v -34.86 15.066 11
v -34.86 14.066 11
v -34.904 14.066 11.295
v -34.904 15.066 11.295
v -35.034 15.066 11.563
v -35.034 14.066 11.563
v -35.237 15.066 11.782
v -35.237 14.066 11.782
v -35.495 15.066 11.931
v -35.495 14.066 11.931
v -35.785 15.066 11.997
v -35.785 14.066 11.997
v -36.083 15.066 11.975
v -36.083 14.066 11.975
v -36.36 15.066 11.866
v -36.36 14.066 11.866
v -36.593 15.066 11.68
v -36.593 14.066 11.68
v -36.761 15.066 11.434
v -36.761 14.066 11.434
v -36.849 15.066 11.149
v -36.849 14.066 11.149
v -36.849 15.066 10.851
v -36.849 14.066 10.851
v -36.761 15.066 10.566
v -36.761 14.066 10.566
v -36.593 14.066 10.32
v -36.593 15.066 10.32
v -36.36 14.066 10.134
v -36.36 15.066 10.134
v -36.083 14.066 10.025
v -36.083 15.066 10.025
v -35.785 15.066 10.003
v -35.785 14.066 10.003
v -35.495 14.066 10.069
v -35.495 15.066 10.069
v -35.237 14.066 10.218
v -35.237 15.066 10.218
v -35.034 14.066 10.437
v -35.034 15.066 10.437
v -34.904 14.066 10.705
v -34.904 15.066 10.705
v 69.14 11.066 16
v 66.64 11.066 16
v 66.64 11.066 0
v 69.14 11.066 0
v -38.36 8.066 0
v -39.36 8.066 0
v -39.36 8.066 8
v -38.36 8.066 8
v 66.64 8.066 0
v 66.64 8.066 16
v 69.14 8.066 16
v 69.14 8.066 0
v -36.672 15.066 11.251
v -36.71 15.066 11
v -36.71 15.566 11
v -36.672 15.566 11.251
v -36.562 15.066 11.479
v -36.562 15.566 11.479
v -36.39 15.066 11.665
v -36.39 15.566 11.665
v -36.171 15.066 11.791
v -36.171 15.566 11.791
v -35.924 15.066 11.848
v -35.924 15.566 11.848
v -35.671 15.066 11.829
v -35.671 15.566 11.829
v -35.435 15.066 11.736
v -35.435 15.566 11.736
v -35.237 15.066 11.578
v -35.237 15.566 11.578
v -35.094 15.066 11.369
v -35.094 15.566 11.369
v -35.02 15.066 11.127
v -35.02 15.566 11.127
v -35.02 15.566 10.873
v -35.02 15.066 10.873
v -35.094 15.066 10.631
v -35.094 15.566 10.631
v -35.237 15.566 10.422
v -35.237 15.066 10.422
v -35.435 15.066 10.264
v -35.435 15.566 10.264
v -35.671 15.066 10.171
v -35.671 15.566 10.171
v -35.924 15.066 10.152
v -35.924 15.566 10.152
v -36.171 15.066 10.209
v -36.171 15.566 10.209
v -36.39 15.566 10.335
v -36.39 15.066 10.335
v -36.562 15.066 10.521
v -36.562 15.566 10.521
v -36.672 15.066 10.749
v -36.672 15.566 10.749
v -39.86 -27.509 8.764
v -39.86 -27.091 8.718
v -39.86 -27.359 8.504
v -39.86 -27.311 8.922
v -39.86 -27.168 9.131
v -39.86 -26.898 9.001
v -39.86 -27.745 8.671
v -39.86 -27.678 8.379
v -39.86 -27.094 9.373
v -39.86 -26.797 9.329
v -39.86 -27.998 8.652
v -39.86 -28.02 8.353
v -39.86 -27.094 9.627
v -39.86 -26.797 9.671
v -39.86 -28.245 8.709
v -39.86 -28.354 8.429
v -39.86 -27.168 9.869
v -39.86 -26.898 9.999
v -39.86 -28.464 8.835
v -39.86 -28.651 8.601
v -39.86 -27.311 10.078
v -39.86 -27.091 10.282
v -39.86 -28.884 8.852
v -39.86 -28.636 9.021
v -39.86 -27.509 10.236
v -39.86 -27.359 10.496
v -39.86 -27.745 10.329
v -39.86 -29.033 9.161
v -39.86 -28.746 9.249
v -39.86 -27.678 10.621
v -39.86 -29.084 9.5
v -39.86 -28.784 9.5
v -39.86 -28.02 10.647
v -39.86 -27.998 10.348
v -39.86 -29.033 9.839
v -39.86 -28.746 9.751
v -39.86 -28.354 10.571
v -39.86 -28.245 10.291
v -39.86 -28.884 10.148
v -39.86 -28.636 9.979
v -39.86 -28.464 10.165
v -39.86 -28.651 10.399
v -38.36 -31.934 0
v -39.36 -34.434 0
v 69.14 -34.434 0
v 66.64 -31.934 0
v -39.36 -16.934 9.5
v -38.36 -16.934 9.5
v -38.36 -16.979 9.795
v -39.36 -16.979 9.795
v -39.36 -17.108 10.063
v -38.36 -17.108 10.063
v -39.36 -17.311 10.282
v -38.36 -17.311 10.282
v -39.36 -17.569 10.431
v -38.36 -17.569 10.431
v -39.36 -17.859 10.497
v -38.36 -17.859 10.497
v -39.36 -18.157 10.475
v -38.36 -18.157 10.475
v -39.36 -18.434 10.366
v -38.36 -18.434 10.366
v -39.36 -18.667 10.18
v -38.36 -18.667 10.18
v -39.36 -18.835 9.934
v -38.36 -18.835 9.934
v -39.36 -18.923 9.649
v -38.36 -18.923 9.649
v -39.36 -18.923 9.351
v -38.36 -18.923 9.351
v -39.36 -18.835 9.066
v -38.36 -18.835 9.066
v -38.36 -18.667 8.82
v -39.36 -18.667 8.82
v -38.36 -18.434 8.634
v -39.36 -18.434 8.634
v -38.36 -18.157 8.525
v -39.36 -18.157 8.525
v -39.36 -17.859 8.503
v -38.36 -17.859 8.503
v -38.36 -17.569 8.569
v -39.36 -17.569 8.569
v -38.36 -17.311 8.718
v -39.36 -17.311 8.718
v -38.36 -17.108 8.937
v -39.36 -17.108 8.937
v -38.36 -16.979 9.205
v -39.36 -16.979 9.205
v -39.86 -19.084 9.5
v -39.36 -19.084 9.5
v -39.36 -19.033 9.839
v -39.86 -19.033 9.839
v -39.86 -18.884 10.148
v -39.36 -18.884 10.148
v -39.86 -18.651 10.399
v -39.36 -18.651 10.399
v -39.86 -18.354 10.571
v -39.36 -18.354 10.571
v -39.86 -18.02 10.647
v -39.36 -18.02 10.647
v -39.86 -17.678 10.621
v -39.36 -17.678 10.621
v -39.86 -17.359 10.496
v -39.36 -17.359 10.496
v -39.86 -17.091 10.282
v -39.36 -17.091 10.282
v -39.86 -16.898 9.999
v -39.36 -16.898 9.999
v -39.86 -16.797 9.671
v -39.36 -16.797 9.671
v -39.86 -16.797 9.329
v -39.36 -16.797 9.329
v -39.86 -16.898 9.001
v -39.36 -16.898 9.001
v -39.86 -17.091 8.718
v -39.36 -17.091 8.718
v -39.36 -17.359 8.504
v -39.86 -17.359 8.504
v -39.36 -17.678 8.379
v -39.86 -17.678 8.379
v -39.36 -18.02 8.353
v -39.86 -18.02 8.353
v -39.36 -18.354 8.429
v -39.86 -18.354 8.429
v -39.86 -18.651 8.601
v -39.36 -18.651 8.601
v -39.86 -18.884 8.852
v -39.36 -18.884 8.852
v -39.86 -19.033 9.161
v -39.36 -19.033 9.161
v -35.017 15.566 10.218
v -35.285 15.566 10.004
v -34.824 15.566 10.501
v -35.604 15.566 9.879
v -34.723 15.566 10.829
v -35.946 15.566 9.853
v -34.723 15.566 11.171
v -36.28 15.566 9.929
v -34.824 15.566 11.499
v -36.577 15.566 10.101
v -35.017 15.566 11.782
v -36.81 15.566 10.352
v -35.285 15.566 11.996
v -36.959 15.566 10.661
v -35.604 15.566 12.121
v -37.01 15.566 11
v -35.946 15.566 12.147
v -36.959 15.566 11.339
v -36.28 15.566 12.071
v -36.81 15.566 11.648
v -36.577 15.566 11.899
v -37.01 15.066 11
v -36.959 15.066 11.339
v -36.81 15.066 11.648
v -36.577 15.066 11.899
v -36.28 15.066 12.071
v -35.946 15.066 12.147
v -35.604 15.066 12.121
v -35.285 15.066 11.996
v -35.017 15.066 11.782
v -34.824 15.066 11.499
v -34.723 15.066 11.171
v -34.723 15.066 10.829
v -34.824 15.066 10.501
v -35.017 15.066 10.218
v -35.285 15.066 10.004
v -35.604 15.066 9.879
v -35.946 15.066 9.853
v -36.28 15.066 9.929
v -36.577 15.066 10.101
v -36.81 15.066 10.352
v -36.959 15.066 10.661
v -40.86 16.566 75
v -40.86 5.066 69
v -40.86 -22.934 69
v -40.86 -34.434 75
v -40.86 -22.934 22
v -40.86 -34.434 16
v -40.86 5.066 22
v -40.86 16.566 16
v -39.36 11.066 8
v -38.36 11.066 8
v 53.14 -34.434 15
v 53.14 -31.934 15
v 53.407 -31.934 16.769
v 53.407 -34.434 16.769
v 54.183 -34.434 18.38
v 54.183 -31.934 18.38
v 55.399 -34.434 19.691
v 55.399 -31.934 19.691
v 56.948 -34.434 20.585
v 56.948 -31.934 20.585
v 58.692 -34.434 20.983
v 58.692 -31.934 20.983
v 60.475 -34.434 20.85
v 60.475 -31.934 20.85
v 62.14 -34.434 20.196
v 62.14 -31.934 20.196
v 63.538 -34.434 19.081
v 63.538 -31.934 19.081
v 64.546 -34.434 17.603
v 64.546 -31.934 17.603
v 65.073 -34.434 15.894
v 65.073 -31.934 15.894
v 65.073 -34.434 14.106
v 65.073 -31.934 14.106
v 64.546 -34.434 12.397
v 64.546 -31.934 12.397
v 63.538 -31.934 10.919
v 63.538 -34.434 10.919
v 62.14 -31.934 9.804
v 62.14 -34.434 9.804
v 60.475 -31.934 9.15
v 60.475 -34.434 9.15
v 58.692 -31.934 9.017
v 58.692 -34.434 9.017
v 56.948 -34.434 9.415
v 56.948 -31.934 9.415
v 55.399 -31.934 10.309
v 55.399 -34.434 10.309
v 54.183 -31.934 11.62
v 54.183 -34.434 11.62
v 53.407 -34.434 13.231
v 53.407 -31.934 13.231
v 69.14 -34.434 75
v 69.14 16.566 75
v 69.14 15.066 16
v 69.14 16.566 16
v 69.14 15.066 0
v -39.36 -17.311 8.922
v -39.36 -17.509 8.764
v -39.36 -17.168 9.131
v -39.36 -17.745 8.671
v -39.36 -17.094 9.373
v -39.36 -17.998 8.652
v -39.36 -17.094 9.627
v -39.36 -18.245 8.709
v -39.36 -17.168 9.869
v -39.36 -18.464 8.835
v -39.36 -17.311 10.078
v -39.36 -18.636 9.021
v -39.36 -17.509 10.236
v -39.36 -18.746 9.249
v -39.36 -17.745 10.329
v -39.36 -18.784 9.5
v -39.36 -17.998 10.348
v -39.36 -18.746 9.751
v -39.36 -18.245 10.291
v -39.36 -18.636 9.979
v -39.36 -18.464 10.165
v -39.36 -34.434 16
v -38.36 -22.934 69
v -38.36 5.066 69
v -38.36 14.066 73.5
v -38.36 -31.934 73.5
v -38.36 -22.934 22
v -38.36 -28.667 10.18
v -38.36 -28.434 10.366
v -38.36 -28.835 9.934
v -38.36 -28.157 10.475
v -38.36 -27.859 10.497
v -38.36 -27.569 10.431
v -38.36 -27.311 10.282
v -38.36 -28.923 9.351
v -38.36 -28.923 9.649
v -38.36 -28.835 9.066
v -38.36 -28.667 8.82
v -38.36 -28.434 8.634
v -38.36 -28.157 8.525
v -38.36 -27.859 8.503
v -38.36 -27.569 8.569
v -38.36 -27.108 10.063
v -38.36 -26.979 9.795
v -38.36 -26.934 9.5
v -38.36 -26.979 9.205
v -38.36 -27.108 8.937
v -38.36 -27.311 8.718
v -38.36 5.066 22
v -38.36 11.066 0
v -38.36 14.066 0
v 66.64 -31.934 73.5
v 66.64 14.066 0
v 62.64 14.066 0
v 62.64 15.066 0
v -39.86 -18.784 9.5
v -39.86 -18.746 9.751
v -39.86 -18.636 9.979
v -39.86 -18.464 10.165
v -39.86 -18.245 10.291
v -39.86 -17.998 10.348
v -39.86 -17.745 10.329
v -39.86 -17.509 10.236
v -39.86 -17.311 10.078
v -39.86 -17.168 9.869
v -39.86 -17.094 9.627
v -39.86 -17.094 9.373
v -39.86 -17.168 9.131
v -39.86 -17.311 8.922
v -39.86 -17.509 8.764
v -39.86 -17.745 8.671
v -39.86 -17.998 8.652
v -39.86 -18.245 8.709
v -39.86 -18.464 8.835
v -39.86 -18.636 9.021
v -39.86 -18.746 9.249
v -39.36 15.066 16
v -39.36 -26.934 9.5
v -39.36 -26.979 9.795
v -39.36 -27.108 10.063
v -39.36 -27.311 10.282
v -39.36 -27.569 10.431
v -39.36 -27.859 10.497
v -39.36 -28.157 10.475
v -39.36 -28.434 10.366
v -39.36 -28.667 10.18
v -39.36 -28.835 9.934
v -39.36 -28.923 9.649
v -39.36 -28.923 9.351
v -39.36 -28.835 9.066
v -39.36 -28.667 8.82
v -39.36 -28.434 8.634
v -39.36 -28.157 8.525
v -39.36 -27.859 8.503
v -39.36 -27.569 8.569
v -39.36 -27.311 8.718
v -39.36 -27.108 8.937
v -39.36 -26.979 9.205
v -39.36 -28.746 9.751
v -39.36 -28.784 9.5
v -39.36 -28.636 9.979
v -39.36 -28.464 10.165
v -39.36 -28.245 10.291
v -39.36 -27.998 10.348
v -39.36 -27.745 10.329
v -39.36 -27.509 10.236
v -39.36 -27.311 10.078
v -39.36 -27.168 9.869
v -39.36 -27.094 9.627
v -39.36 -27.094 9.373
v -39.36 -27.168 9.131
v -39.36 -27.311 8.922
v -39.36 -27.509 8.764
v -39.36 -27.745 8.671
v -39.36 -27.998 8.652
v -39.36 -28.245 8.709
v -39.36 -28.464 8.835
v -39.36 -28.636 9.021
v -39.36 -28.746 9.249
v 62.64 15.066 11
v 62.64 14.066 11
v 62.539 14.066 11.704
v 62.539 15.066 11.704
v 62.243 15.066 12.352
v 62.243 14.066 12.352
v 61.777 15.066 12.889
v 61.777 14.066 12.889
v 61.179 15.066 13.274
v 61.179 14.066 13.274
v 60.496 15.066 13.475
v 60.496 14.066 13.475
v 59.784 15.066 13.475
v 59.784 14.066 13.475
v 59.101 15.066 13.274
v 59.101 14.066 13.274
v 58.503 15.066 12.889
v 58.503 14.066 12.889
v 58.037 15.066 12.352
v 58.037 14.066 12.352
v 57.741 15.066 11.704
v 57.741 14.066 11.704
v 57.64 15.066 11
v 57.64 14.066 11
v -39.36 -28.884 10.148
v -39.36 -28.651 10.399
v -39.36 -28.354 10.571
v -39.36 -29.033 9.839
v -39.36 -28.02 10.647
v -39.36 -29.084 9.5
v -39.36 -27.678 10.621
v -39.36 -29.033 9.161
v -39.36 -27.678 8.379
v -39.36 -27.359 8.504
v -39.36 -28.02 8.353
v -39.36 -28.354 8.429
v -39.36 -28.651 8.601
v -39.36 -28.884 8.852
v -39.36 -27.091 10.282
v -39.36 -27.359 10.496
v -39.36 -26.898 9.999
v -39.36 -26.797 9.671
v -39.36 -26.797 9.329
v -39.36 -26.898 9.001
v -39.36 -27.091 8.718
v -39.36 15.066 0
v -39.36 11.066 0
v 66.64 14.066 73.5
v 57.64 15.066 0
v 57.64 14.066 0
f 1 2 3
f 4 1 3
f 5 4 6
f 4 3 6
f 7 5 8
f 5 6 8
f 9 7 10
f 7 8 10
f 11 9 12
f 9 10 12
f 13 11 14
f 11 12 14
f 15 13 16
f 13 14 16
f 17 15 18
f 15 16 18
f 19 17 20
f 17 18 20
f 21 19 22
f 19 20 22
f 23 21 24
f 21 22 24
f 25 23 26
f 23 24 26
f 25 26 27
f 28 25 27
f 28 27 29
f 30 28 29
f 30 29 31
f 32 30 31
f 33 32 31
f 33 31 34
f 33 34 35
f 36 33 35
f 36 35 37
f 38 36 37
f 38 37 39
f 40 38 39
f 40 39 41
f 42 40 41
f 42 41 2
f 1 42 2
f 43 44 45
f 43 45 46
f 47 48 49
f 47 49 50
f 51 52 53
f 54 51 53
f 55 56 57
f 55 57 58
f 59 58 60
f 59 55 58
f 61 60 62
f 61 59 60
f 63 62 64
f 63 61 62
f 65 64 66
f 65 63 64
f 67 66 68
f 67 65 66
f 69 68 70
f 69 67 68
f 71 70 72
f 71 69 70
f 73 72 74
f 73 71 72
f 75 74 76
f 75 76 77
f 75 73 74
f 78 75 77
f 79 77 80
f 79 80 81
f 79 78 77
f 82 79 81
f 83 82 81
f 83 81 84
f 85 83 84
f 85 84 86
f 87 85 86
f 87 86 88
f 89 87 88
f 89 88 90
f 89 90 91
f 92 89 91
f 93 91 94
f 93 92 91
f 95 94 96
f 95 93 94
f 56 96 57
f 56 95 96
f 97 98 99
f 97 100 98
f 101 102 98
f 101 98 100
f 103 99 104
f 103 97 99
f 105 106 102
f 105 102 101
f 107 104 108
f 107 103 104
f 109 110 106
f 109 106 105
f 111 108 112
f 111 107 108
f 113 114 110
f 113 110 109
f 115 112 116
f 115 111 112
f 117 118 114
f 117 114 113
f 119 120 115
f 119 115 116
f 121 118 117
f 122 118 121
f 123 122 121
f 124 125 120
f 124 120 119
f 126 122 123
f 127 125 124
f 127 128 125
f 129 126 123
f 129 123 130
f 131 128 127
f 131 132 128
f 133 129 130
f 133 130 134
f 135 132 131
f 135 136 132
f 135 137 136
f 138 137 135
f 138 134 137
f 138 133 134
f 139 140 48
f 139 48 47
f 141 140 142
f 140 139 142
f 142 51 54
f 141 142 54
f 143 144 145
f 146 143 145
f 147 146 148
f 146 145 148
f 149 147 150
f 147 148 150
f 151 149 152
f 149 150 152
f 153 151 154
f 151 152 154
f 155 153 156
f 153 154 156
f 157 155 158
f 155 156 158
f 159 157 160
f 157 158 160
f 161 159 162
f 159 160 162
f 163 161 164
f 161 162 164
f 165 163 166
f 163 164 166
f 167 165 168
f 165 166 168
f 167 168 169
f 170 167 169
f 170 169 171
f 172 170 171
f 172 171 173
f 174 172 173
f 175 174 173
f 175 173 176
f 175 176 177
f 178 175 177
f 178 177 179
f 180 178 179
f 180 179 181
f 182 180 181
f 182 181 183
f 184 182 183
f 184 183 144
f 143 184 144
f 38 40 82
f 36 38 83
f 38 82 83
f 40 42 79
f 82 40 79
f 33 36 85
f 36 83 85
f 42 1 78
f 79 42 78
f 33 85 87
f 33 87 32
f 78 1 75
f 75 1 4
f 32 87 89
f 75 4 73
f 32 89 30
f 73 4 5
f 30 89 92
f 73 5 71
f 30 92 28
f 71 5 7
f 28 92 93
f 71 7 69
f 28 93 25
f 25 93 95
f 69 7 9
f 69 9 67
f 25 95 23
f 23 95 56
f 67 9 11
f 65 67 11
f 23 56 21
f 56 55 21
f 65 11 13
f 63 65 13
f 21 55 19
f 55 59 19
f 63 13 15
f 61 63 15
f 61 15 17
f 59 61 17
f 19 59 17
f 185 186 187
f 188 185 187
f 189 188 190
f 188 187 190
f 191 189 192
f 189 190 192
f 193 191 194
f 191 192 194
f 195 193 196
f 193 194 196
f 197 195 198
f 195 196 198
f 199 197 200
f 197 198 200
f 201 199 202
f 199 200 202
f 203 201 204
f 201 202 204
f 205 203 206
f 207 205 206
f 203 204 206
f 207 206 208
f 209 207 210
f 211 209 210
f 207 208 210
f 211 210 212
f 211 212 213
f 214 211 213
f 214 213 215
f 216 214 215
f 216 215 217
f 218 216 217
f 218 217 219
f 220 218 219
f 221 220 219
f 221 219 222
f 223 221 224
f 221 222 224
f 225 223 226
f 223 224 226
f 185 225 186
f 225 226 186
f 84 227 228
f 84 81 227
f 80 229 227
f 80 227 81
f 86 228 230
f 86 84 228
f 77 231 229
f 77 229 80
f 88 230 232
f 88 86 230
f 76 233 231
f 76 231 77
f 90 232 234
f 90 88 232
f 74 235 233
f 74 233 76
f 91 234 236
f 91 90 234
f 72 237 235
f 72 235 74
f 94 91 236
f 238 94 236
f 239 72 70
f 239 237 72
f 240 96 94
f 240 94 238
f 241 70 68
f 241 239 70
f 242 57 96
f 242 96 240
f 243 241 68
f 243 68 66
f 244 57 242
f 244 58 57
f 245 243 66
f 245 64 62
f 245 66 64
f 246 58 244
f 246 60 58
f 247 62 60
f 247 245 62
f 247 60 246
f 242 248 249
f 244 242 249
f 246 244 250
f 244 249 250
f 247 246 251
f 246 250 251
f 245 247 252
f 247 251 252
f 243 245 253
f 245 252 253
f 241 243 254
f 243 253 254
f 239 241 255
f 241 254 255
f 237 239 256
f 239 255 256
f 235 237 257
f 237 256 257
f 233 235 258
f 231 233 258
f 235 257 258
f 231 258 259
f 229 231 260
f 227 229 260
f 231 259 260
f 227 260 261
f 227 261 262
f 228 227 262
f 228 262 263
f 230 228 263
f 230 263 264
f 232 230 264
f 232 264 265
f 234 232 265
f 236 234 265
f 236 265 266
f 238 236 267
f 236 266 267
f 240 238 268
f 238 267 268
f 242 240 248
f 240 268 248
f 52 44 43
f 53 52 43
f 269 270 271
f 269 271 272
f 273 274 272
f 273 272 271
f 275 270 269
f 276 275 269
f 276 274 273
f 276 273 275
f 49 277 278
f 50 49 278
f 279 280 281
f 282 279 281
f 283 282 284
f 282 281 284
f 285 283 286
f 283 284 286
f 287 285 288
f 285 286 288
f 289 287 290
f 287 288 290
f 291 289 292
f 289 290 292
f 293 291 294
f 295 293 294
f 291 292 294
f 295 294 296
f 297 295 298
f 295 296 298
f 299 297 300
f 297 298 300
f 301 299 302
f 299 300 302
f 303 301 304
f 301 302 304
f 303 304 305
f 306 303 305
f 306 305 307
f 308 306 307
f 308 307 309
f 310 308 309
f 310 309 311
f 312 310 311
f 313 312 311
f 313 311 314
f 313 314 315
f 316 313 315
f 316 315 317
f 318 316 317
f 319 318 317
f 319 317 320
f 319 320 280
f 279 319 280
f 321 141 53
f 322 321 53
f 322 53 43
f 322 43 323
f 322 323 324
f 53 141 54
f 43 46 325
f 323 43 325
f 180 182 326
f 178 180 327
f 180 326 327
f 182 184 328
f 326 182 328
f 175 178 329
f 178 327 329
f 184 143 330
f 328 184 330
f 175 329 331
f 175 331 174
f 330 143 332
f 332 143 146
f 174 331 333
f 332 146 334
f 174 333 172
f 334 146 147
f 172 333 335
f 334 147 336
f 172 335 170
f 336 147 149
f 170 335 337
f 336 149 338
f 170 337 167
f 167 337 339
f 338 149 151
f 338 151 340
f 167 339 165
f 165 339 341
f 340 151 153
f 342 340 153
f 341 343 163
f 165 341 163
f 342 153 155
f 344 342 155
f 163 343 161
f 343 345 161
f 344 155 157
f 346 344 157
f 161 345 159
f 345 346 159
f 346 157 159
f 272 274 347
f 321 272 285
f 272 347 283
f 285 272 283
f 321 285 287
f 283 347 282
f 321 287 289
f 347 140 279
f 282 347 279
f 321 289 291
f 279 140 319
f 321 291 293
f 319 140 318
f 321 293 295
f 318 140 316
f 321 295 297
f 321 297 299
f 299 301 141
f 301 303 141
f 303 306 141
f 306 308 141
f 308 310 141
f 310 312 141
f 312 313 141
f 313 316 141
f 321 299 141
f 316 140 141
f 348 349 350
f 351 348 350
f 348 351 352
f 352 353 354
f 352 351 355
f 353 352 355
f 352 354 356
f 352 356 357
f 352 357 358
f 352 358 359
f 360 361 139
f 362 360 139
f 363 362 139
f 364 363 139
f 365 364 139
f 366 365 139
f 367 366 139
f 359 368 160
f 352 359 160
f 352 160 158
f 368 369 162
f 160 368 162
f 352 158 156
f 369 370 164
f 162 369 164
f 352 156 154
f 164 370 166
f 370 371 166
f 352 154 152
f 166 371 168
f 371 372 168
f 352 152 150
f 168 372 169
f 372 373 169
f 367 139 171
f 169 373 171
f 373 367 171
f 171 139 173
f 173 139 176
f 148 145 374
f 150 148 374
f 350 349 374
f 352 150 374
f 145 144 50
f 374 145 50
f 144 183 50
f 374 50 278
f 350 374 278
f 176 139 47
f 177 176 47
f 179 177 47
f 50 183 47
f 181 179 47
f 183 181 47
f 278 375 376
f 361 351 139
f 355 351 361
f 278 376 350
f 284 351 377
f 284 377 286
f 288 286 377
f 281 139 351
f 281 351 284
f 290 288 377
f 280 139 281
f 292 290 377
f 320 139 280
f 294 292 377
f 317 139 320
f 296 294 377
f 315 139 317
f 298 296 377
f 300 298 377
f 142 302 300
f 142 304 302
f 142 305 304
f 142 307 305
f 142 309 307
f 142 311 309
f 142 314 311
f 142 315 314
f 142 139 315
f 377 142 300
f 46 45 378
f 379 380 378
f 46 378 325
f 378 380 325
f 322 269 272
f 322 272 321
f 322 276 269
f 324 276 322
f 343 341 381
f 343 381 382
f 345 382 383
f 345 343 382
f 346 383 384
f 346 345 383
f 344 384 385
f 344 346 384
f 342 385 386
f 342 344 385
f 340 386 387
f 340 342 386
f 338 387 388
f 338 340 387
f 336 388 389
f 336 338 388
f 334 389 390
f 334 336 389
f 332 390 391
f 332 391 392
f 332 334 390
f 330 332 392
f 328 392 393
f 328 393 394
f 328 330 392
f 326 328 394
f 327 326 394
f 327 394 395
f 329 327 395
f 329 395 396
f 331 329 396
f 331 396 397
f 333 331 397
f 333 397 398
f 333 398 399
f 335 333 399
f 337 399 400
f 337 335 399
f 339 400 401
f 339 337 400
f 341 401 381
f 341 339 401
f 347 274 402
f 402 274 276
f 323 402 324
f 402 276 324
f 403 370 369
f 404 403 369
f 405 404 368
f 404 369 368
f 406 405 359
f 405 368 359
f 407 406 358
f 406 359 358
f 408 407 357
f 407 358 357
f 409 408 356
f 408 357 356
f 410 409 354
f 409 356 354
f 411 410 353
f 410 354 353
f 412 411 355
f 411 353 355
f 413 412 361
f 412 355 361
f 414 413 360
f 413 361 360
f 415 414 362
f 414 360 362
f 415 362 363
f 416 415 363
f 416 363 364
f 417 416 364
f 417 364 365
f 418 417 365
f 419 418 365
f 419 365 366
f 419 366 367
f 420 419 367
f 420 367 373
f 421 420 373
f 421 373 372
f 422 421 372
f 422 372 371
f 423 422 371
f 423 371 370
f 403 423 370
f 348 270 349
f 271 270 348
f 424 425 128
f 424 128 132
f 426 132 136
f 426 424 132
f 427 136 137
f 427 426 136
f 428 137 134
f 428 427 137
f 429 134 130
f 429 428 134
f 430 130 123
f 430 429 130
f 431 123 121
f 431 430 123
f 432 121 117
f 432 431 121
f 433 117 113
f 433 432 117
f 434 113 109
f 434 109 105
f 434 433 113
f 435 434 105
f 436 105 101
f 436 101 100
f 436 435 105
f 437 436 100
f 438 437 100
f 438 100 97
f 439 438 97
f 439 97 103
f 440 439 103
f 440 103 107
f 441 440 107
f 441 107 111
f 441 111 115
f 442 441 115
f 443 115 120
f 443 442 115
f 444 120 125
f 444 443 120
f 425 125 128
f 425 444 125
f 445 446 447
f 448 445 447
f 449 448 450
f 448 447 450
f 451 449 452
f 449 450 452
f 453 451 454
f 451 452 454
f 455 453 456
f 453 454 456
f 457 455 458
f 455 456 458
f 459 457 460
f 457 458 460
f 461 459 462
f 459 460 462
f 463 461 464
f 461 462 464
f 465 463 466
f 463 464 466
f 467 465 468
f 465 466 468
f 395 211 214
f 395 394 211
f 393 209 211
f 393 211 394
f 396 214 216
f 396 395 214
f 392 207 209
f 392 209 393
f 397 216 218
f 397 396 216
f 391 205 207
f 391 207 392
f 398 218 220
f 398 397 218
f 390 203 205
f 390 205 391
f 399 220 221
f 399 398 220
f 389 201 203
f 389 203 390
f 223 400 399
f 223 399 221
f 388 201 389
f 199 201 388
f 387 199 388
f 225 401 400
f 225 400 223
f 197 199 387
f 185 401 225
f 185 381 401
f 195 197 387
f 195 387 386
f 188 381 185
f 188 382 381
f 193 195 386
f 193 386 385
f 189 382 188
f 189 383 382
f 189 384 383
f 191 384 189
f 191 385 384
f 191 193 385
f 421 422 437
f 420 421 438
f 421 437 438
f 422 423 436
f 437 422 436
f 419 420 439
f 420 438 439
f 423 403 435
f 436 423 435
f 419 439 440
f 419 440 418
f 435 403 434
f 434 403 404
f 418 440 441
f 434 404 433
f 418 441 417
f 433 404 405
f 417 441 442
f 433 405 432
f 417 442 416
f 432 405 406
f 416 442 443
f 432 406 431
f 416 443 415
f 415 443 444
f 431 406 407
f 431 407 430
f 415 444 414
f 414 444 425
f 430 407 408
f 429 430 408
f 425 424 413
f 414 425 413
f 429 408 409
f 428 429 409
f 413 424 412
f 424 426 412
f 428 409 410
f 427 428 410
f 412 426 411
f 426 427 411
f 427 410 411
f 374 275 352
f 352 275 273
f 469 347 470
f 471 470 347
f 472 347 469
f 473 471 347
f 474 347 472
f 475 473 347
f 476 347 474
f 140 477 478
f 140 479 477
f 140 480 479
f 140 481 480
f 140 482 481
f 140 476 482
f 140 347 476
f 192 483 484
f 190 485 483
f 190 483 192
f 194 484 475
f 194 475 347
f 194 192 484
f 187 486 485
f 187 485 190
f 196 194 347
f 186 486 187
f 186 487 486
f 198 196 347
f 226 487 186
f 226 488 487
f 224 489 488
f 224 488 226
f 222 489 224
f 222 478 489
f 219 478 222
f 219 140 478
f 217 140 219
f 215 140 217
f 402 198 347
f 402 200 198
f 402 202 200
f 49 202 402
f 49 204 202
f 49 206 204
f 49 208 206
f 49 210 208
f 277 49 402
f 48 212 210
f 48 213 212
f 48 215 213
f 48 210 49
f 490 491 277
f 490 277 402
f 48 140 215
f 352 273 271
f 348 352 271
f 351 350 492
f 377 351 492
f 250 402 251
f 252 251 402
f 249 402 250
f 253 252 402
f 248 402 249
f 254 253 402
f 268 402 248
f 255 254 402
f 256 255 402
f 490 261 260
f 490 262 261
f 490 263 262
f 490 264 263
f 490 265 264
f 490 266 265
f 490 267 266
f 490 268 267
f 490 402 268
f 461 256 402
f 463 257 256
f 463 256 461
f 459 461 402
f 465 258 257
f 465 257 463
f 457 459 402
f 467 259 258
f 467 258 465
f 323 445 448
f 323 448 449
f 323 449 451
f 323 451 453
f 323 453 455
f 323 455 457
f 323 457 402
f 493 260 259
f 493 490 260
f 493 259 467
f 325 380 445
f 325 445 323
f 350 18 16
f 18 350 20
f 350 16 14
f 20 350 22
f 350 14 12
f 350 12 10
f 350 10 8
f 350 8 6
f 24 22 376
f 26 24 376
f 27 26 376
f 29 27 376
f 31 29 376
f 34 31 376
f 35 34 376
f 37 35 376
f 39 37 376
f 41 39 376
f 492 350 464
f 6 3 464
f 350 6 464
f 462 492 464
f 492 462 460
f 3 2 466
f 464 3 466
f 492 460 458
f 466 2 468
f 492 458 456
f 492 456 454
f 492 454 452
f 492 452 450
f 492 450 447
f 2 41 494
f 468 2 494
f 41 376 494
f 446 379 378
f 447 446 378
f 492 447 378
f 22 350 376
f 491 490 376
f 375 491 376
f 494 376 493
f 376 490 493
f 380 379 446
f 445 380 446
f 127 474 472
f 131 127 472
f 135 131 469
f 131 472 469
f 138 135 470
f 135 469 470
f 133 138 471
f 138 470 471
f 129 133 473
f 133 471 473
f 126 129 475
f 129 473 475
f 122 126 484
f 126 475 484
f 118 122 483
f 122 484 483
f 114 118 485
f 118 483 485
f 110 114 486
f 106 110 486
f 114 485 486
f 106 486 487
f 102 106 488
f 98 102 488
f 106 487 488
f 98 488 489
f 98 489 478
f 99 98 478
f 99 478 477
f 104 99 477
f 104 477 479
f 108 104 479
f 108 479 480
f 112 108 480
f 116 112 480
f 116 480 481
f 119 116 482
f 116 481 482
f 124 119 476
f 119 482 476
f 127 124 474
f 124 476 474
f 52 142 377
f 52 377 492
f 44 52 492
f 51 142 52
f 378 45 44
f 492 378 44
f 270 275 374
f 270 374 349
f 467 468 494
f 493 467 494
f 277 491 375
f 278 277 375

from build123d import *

# Parameters (mm, degrees)
F0_W      = 110
F0_H      = 51
F0_W_2    = 105
F0_H_2    = 46
F1_DEPTH  = 75
F3_DEPTH  = 16
F5_W      = 1
F5_H      = 3
F6_DEPTH  = 8
F8_W      = 2.5
F8_H      = 3
F9_DEPTH  = 16
F12_DEPTH = 5
F15_D     = 2
F15_DEPTH = 12
F15_TIP   = 0.600860619
F16_W     = 28
F16_H     = 47
F17_DEPTH = 12.5
F19_W     = 105
F19_H     = 46
F20_DEPTH = 1.5
F22_D     = 12
F22_DEPTH = 12
F22_TIP   = 3.6051637142
F14_R     = 1.15
F14_R_2   = 0.85
F23_DEPTH = 0.5
F25_D     = 2
F25_DEPTH = 12
F25_TIP   = 0.600860619
F24_R     = 1.15
F24_R_2   = 0.85
F26_DEPTH = 0.5


# Not quite as in the source:
# - a feature names something its author has since deleted; it is built from what else it names


with BuildPart() as f1:
    # F0 (on Top) → F1 (new body)
    with BuildSketch(Plane.XY):
        with Locations((14.1399928927, -8.9340824737)):
            Rectangle(F0_W, F0_H)
        with Locations((14.1399928927, -8.9340824737)):
            Rectangle(F0_W_2, F0_H_2, mode=Mode.SUBTRACT)
    extrude(amount=F1_DEPTH)


with BuildPart() as f3:
    # F2 (on face) → F3 (new body)
    with BuildSketch(Plane.XY):
        Polygon((-39.3600071073, -34.4340824737), (-39.3600071073, 15.0659175263), (69.1399928927, 15.0659175263), (69.1399928927, 16.5659175263), (-40.8600071073, 16.5659175263), (-40.8600071073, -34.4340824737), align=None)
    extrude(amount=F3_DEPTH)


with BuildPart() as f1_1:
    add(f1.part)

    # F4: cut F3
    add(f3.part, mode=Mode.SUBTRACT)


with BuildPart() as f6:
    # F5 (on face) → F6 (new body)
    with BuildSketch(Plane.XY):
        with Locations((-38.8600071073, 9.5659175263)):
            Rectangle(F5_W, F5_H)
    extrude(amount=F6_DEPTH)


with BuildPart() as f1_2:
    add(f1_1.part)

    # F7: cut F6
    add(f6.part, mode=Mode.SUBTRACT)


with BuildPart() as f9:
    # F8 (on face) → F9 (new body)
    with BuildSketch(Plane.XY):
        with Locations((67.8899928927, 9.5659175263)):
            Rectangle(F8_W, F8_H)
    extrude(amount=F9_DEPTH)


with BuildPart() as f1_3:
    add(f1_2.part)

    # F10: cut F9
    add(f9.part, mode=Mode.SUBTRACT)


with BuildPart() as f12:
    # F11 (on face) → F12 (new body, symmetric)
    with BuildSketch(Plane.XZ.offset(-14.0659175263)):
        with BuildLine():
            Line((62.6399928927, 0), (62.6399928927, 11))
            ThreePointArc((62.6399928927, 11), (60.1399928927, 8.5), (57.6399928927, 11))
            Line((57.6399928927, 11), (57.6399928927, 0))
            Line((57.6399928927, 0), (62.6399928927, 0))
        make_face()
        with BuildLine():
            ThreePointArc((57.6399928927, 11), (60.1399928927, 8.5), (62.6399928927, 11))
            ThreePointArc((62.6399928927, 11), (60.1399928927, 13.5), (57.6399928927, 11))
        make_face()
    extrude(amount=F12_DEPTH, both=True)


with BuildPart() as f1_4:
    add(f1_3.part)

    # F13: cut F12
    add(f12.part, mode=Mode.SUBTRACT)

    # F15
    with Locations(Plane(origin=(-39.3600071073, 0, 0), x_dir=(0, -1, 0), z_dir=(-1, 0, 0))):
        with Locations((27.9340824737, 9.5), (17.9340824737, 9.5)):
            Hole(F15_D / 2, depth=F15_DEPTH)
            with Locations((0, 0, -(F15_DEPTH + F15_TIP / 2))):  # 118° drill point
                Cone(0, F15_D / 2, F15_TIP, mode=Mode.SUBTRACT)


with BuildPart() as f17:
    # F16 (on face) → F17 (new body, symmetric)
    with BuildSketch(Plane(origin=(-40.8600071073, 0, 0), x_dir=(0, -1, 0), z_dir=(-1, 0, 0))):
        with Locations((8.9340824737, 45.5)):
            Rectangle(F16_W, F16_H)
    extrude(amount=F17_DEPTH, both=True)


with BuildPart() as f1_5:
    add(f1_4.part)

    # F18: cut F17
    add(f17.part, mode=Mode.SUBTRACT)

    # F19 (on face) → F20 (join)
    with BuildSketch(Plane.XY.offset(75)):
        with Locations((14.1399928927, -8.9340824737)):
            Rectangle(F19_W, F19_H)
    extrude(amount=-F20_DEPTH)

    # F22
    with Locations(Plane.XZ.offset(34.4340824737)):
        with Locations((59.1399928927, 15)):
            Hole(F22_D / 2, depth=F22_DEPTH)
            with Locations((0, 0, -(F22_DEPTH + F22_TIP / 2))):  # 118° drill point
                Cone(0, F22_D / 2, F22_TIP, mode=Mode.SUBTRACT)

    # F14 (on face) → F23 (join)
    with BuildSketch(Plane(origin=(-39.3600071073, 0, 0), x_dir=(0, -1, 0), z_dir=(-1, 0, 0))):
        with Locations((27.9340824737, 9.5)):
            Circle(F14_R)
        with Locations((27.9340824737, 9.5)):
            Circle(F14_R_2, mode=Mode.SUBTRACT)
        with Locations((17.9340824737, 9.5)):
            Circle(F14_R)
        with Locations((17.9340824737, 9.5)):
            Circle(F14_R_2, mode=Mode.SUBTRACT)
    extrude(amount=F23_DEPTH)

    # F25
    with Locations(Plane(origin=(0, 15.0659175263, 0), x_dir=(-1, 0, 0), z_dir=(0, 1, 0))):
        with Locations((35.8600071073, 11)):
            Hole(F25_D / 2, depth=F25_DEPTH)
            with Locations((0, 0, -(F25_DEPTH + F25_TIP / 2))):  # 118° drill point
                Cone(0, F25_D / 2, F25_TIP, mode=Mode.SUBTRACT)

    # F24 (on face) → F26 (join)
    with BuildSketch(Plane(origin=(0, 15.0659175263, 0), x_dir=(-1, 0, 0), z_dir=(0, 1, 0))):
        with Locations((35.8600071073, 11)):
            Circle(F24_R)
        with Locations((35.8600071073, 11)):
            Circle(F24_R_2, mode=Mode.SUBTRACT)
    extrude(amount=F26_DEPTH)


solid = f1_5.part
